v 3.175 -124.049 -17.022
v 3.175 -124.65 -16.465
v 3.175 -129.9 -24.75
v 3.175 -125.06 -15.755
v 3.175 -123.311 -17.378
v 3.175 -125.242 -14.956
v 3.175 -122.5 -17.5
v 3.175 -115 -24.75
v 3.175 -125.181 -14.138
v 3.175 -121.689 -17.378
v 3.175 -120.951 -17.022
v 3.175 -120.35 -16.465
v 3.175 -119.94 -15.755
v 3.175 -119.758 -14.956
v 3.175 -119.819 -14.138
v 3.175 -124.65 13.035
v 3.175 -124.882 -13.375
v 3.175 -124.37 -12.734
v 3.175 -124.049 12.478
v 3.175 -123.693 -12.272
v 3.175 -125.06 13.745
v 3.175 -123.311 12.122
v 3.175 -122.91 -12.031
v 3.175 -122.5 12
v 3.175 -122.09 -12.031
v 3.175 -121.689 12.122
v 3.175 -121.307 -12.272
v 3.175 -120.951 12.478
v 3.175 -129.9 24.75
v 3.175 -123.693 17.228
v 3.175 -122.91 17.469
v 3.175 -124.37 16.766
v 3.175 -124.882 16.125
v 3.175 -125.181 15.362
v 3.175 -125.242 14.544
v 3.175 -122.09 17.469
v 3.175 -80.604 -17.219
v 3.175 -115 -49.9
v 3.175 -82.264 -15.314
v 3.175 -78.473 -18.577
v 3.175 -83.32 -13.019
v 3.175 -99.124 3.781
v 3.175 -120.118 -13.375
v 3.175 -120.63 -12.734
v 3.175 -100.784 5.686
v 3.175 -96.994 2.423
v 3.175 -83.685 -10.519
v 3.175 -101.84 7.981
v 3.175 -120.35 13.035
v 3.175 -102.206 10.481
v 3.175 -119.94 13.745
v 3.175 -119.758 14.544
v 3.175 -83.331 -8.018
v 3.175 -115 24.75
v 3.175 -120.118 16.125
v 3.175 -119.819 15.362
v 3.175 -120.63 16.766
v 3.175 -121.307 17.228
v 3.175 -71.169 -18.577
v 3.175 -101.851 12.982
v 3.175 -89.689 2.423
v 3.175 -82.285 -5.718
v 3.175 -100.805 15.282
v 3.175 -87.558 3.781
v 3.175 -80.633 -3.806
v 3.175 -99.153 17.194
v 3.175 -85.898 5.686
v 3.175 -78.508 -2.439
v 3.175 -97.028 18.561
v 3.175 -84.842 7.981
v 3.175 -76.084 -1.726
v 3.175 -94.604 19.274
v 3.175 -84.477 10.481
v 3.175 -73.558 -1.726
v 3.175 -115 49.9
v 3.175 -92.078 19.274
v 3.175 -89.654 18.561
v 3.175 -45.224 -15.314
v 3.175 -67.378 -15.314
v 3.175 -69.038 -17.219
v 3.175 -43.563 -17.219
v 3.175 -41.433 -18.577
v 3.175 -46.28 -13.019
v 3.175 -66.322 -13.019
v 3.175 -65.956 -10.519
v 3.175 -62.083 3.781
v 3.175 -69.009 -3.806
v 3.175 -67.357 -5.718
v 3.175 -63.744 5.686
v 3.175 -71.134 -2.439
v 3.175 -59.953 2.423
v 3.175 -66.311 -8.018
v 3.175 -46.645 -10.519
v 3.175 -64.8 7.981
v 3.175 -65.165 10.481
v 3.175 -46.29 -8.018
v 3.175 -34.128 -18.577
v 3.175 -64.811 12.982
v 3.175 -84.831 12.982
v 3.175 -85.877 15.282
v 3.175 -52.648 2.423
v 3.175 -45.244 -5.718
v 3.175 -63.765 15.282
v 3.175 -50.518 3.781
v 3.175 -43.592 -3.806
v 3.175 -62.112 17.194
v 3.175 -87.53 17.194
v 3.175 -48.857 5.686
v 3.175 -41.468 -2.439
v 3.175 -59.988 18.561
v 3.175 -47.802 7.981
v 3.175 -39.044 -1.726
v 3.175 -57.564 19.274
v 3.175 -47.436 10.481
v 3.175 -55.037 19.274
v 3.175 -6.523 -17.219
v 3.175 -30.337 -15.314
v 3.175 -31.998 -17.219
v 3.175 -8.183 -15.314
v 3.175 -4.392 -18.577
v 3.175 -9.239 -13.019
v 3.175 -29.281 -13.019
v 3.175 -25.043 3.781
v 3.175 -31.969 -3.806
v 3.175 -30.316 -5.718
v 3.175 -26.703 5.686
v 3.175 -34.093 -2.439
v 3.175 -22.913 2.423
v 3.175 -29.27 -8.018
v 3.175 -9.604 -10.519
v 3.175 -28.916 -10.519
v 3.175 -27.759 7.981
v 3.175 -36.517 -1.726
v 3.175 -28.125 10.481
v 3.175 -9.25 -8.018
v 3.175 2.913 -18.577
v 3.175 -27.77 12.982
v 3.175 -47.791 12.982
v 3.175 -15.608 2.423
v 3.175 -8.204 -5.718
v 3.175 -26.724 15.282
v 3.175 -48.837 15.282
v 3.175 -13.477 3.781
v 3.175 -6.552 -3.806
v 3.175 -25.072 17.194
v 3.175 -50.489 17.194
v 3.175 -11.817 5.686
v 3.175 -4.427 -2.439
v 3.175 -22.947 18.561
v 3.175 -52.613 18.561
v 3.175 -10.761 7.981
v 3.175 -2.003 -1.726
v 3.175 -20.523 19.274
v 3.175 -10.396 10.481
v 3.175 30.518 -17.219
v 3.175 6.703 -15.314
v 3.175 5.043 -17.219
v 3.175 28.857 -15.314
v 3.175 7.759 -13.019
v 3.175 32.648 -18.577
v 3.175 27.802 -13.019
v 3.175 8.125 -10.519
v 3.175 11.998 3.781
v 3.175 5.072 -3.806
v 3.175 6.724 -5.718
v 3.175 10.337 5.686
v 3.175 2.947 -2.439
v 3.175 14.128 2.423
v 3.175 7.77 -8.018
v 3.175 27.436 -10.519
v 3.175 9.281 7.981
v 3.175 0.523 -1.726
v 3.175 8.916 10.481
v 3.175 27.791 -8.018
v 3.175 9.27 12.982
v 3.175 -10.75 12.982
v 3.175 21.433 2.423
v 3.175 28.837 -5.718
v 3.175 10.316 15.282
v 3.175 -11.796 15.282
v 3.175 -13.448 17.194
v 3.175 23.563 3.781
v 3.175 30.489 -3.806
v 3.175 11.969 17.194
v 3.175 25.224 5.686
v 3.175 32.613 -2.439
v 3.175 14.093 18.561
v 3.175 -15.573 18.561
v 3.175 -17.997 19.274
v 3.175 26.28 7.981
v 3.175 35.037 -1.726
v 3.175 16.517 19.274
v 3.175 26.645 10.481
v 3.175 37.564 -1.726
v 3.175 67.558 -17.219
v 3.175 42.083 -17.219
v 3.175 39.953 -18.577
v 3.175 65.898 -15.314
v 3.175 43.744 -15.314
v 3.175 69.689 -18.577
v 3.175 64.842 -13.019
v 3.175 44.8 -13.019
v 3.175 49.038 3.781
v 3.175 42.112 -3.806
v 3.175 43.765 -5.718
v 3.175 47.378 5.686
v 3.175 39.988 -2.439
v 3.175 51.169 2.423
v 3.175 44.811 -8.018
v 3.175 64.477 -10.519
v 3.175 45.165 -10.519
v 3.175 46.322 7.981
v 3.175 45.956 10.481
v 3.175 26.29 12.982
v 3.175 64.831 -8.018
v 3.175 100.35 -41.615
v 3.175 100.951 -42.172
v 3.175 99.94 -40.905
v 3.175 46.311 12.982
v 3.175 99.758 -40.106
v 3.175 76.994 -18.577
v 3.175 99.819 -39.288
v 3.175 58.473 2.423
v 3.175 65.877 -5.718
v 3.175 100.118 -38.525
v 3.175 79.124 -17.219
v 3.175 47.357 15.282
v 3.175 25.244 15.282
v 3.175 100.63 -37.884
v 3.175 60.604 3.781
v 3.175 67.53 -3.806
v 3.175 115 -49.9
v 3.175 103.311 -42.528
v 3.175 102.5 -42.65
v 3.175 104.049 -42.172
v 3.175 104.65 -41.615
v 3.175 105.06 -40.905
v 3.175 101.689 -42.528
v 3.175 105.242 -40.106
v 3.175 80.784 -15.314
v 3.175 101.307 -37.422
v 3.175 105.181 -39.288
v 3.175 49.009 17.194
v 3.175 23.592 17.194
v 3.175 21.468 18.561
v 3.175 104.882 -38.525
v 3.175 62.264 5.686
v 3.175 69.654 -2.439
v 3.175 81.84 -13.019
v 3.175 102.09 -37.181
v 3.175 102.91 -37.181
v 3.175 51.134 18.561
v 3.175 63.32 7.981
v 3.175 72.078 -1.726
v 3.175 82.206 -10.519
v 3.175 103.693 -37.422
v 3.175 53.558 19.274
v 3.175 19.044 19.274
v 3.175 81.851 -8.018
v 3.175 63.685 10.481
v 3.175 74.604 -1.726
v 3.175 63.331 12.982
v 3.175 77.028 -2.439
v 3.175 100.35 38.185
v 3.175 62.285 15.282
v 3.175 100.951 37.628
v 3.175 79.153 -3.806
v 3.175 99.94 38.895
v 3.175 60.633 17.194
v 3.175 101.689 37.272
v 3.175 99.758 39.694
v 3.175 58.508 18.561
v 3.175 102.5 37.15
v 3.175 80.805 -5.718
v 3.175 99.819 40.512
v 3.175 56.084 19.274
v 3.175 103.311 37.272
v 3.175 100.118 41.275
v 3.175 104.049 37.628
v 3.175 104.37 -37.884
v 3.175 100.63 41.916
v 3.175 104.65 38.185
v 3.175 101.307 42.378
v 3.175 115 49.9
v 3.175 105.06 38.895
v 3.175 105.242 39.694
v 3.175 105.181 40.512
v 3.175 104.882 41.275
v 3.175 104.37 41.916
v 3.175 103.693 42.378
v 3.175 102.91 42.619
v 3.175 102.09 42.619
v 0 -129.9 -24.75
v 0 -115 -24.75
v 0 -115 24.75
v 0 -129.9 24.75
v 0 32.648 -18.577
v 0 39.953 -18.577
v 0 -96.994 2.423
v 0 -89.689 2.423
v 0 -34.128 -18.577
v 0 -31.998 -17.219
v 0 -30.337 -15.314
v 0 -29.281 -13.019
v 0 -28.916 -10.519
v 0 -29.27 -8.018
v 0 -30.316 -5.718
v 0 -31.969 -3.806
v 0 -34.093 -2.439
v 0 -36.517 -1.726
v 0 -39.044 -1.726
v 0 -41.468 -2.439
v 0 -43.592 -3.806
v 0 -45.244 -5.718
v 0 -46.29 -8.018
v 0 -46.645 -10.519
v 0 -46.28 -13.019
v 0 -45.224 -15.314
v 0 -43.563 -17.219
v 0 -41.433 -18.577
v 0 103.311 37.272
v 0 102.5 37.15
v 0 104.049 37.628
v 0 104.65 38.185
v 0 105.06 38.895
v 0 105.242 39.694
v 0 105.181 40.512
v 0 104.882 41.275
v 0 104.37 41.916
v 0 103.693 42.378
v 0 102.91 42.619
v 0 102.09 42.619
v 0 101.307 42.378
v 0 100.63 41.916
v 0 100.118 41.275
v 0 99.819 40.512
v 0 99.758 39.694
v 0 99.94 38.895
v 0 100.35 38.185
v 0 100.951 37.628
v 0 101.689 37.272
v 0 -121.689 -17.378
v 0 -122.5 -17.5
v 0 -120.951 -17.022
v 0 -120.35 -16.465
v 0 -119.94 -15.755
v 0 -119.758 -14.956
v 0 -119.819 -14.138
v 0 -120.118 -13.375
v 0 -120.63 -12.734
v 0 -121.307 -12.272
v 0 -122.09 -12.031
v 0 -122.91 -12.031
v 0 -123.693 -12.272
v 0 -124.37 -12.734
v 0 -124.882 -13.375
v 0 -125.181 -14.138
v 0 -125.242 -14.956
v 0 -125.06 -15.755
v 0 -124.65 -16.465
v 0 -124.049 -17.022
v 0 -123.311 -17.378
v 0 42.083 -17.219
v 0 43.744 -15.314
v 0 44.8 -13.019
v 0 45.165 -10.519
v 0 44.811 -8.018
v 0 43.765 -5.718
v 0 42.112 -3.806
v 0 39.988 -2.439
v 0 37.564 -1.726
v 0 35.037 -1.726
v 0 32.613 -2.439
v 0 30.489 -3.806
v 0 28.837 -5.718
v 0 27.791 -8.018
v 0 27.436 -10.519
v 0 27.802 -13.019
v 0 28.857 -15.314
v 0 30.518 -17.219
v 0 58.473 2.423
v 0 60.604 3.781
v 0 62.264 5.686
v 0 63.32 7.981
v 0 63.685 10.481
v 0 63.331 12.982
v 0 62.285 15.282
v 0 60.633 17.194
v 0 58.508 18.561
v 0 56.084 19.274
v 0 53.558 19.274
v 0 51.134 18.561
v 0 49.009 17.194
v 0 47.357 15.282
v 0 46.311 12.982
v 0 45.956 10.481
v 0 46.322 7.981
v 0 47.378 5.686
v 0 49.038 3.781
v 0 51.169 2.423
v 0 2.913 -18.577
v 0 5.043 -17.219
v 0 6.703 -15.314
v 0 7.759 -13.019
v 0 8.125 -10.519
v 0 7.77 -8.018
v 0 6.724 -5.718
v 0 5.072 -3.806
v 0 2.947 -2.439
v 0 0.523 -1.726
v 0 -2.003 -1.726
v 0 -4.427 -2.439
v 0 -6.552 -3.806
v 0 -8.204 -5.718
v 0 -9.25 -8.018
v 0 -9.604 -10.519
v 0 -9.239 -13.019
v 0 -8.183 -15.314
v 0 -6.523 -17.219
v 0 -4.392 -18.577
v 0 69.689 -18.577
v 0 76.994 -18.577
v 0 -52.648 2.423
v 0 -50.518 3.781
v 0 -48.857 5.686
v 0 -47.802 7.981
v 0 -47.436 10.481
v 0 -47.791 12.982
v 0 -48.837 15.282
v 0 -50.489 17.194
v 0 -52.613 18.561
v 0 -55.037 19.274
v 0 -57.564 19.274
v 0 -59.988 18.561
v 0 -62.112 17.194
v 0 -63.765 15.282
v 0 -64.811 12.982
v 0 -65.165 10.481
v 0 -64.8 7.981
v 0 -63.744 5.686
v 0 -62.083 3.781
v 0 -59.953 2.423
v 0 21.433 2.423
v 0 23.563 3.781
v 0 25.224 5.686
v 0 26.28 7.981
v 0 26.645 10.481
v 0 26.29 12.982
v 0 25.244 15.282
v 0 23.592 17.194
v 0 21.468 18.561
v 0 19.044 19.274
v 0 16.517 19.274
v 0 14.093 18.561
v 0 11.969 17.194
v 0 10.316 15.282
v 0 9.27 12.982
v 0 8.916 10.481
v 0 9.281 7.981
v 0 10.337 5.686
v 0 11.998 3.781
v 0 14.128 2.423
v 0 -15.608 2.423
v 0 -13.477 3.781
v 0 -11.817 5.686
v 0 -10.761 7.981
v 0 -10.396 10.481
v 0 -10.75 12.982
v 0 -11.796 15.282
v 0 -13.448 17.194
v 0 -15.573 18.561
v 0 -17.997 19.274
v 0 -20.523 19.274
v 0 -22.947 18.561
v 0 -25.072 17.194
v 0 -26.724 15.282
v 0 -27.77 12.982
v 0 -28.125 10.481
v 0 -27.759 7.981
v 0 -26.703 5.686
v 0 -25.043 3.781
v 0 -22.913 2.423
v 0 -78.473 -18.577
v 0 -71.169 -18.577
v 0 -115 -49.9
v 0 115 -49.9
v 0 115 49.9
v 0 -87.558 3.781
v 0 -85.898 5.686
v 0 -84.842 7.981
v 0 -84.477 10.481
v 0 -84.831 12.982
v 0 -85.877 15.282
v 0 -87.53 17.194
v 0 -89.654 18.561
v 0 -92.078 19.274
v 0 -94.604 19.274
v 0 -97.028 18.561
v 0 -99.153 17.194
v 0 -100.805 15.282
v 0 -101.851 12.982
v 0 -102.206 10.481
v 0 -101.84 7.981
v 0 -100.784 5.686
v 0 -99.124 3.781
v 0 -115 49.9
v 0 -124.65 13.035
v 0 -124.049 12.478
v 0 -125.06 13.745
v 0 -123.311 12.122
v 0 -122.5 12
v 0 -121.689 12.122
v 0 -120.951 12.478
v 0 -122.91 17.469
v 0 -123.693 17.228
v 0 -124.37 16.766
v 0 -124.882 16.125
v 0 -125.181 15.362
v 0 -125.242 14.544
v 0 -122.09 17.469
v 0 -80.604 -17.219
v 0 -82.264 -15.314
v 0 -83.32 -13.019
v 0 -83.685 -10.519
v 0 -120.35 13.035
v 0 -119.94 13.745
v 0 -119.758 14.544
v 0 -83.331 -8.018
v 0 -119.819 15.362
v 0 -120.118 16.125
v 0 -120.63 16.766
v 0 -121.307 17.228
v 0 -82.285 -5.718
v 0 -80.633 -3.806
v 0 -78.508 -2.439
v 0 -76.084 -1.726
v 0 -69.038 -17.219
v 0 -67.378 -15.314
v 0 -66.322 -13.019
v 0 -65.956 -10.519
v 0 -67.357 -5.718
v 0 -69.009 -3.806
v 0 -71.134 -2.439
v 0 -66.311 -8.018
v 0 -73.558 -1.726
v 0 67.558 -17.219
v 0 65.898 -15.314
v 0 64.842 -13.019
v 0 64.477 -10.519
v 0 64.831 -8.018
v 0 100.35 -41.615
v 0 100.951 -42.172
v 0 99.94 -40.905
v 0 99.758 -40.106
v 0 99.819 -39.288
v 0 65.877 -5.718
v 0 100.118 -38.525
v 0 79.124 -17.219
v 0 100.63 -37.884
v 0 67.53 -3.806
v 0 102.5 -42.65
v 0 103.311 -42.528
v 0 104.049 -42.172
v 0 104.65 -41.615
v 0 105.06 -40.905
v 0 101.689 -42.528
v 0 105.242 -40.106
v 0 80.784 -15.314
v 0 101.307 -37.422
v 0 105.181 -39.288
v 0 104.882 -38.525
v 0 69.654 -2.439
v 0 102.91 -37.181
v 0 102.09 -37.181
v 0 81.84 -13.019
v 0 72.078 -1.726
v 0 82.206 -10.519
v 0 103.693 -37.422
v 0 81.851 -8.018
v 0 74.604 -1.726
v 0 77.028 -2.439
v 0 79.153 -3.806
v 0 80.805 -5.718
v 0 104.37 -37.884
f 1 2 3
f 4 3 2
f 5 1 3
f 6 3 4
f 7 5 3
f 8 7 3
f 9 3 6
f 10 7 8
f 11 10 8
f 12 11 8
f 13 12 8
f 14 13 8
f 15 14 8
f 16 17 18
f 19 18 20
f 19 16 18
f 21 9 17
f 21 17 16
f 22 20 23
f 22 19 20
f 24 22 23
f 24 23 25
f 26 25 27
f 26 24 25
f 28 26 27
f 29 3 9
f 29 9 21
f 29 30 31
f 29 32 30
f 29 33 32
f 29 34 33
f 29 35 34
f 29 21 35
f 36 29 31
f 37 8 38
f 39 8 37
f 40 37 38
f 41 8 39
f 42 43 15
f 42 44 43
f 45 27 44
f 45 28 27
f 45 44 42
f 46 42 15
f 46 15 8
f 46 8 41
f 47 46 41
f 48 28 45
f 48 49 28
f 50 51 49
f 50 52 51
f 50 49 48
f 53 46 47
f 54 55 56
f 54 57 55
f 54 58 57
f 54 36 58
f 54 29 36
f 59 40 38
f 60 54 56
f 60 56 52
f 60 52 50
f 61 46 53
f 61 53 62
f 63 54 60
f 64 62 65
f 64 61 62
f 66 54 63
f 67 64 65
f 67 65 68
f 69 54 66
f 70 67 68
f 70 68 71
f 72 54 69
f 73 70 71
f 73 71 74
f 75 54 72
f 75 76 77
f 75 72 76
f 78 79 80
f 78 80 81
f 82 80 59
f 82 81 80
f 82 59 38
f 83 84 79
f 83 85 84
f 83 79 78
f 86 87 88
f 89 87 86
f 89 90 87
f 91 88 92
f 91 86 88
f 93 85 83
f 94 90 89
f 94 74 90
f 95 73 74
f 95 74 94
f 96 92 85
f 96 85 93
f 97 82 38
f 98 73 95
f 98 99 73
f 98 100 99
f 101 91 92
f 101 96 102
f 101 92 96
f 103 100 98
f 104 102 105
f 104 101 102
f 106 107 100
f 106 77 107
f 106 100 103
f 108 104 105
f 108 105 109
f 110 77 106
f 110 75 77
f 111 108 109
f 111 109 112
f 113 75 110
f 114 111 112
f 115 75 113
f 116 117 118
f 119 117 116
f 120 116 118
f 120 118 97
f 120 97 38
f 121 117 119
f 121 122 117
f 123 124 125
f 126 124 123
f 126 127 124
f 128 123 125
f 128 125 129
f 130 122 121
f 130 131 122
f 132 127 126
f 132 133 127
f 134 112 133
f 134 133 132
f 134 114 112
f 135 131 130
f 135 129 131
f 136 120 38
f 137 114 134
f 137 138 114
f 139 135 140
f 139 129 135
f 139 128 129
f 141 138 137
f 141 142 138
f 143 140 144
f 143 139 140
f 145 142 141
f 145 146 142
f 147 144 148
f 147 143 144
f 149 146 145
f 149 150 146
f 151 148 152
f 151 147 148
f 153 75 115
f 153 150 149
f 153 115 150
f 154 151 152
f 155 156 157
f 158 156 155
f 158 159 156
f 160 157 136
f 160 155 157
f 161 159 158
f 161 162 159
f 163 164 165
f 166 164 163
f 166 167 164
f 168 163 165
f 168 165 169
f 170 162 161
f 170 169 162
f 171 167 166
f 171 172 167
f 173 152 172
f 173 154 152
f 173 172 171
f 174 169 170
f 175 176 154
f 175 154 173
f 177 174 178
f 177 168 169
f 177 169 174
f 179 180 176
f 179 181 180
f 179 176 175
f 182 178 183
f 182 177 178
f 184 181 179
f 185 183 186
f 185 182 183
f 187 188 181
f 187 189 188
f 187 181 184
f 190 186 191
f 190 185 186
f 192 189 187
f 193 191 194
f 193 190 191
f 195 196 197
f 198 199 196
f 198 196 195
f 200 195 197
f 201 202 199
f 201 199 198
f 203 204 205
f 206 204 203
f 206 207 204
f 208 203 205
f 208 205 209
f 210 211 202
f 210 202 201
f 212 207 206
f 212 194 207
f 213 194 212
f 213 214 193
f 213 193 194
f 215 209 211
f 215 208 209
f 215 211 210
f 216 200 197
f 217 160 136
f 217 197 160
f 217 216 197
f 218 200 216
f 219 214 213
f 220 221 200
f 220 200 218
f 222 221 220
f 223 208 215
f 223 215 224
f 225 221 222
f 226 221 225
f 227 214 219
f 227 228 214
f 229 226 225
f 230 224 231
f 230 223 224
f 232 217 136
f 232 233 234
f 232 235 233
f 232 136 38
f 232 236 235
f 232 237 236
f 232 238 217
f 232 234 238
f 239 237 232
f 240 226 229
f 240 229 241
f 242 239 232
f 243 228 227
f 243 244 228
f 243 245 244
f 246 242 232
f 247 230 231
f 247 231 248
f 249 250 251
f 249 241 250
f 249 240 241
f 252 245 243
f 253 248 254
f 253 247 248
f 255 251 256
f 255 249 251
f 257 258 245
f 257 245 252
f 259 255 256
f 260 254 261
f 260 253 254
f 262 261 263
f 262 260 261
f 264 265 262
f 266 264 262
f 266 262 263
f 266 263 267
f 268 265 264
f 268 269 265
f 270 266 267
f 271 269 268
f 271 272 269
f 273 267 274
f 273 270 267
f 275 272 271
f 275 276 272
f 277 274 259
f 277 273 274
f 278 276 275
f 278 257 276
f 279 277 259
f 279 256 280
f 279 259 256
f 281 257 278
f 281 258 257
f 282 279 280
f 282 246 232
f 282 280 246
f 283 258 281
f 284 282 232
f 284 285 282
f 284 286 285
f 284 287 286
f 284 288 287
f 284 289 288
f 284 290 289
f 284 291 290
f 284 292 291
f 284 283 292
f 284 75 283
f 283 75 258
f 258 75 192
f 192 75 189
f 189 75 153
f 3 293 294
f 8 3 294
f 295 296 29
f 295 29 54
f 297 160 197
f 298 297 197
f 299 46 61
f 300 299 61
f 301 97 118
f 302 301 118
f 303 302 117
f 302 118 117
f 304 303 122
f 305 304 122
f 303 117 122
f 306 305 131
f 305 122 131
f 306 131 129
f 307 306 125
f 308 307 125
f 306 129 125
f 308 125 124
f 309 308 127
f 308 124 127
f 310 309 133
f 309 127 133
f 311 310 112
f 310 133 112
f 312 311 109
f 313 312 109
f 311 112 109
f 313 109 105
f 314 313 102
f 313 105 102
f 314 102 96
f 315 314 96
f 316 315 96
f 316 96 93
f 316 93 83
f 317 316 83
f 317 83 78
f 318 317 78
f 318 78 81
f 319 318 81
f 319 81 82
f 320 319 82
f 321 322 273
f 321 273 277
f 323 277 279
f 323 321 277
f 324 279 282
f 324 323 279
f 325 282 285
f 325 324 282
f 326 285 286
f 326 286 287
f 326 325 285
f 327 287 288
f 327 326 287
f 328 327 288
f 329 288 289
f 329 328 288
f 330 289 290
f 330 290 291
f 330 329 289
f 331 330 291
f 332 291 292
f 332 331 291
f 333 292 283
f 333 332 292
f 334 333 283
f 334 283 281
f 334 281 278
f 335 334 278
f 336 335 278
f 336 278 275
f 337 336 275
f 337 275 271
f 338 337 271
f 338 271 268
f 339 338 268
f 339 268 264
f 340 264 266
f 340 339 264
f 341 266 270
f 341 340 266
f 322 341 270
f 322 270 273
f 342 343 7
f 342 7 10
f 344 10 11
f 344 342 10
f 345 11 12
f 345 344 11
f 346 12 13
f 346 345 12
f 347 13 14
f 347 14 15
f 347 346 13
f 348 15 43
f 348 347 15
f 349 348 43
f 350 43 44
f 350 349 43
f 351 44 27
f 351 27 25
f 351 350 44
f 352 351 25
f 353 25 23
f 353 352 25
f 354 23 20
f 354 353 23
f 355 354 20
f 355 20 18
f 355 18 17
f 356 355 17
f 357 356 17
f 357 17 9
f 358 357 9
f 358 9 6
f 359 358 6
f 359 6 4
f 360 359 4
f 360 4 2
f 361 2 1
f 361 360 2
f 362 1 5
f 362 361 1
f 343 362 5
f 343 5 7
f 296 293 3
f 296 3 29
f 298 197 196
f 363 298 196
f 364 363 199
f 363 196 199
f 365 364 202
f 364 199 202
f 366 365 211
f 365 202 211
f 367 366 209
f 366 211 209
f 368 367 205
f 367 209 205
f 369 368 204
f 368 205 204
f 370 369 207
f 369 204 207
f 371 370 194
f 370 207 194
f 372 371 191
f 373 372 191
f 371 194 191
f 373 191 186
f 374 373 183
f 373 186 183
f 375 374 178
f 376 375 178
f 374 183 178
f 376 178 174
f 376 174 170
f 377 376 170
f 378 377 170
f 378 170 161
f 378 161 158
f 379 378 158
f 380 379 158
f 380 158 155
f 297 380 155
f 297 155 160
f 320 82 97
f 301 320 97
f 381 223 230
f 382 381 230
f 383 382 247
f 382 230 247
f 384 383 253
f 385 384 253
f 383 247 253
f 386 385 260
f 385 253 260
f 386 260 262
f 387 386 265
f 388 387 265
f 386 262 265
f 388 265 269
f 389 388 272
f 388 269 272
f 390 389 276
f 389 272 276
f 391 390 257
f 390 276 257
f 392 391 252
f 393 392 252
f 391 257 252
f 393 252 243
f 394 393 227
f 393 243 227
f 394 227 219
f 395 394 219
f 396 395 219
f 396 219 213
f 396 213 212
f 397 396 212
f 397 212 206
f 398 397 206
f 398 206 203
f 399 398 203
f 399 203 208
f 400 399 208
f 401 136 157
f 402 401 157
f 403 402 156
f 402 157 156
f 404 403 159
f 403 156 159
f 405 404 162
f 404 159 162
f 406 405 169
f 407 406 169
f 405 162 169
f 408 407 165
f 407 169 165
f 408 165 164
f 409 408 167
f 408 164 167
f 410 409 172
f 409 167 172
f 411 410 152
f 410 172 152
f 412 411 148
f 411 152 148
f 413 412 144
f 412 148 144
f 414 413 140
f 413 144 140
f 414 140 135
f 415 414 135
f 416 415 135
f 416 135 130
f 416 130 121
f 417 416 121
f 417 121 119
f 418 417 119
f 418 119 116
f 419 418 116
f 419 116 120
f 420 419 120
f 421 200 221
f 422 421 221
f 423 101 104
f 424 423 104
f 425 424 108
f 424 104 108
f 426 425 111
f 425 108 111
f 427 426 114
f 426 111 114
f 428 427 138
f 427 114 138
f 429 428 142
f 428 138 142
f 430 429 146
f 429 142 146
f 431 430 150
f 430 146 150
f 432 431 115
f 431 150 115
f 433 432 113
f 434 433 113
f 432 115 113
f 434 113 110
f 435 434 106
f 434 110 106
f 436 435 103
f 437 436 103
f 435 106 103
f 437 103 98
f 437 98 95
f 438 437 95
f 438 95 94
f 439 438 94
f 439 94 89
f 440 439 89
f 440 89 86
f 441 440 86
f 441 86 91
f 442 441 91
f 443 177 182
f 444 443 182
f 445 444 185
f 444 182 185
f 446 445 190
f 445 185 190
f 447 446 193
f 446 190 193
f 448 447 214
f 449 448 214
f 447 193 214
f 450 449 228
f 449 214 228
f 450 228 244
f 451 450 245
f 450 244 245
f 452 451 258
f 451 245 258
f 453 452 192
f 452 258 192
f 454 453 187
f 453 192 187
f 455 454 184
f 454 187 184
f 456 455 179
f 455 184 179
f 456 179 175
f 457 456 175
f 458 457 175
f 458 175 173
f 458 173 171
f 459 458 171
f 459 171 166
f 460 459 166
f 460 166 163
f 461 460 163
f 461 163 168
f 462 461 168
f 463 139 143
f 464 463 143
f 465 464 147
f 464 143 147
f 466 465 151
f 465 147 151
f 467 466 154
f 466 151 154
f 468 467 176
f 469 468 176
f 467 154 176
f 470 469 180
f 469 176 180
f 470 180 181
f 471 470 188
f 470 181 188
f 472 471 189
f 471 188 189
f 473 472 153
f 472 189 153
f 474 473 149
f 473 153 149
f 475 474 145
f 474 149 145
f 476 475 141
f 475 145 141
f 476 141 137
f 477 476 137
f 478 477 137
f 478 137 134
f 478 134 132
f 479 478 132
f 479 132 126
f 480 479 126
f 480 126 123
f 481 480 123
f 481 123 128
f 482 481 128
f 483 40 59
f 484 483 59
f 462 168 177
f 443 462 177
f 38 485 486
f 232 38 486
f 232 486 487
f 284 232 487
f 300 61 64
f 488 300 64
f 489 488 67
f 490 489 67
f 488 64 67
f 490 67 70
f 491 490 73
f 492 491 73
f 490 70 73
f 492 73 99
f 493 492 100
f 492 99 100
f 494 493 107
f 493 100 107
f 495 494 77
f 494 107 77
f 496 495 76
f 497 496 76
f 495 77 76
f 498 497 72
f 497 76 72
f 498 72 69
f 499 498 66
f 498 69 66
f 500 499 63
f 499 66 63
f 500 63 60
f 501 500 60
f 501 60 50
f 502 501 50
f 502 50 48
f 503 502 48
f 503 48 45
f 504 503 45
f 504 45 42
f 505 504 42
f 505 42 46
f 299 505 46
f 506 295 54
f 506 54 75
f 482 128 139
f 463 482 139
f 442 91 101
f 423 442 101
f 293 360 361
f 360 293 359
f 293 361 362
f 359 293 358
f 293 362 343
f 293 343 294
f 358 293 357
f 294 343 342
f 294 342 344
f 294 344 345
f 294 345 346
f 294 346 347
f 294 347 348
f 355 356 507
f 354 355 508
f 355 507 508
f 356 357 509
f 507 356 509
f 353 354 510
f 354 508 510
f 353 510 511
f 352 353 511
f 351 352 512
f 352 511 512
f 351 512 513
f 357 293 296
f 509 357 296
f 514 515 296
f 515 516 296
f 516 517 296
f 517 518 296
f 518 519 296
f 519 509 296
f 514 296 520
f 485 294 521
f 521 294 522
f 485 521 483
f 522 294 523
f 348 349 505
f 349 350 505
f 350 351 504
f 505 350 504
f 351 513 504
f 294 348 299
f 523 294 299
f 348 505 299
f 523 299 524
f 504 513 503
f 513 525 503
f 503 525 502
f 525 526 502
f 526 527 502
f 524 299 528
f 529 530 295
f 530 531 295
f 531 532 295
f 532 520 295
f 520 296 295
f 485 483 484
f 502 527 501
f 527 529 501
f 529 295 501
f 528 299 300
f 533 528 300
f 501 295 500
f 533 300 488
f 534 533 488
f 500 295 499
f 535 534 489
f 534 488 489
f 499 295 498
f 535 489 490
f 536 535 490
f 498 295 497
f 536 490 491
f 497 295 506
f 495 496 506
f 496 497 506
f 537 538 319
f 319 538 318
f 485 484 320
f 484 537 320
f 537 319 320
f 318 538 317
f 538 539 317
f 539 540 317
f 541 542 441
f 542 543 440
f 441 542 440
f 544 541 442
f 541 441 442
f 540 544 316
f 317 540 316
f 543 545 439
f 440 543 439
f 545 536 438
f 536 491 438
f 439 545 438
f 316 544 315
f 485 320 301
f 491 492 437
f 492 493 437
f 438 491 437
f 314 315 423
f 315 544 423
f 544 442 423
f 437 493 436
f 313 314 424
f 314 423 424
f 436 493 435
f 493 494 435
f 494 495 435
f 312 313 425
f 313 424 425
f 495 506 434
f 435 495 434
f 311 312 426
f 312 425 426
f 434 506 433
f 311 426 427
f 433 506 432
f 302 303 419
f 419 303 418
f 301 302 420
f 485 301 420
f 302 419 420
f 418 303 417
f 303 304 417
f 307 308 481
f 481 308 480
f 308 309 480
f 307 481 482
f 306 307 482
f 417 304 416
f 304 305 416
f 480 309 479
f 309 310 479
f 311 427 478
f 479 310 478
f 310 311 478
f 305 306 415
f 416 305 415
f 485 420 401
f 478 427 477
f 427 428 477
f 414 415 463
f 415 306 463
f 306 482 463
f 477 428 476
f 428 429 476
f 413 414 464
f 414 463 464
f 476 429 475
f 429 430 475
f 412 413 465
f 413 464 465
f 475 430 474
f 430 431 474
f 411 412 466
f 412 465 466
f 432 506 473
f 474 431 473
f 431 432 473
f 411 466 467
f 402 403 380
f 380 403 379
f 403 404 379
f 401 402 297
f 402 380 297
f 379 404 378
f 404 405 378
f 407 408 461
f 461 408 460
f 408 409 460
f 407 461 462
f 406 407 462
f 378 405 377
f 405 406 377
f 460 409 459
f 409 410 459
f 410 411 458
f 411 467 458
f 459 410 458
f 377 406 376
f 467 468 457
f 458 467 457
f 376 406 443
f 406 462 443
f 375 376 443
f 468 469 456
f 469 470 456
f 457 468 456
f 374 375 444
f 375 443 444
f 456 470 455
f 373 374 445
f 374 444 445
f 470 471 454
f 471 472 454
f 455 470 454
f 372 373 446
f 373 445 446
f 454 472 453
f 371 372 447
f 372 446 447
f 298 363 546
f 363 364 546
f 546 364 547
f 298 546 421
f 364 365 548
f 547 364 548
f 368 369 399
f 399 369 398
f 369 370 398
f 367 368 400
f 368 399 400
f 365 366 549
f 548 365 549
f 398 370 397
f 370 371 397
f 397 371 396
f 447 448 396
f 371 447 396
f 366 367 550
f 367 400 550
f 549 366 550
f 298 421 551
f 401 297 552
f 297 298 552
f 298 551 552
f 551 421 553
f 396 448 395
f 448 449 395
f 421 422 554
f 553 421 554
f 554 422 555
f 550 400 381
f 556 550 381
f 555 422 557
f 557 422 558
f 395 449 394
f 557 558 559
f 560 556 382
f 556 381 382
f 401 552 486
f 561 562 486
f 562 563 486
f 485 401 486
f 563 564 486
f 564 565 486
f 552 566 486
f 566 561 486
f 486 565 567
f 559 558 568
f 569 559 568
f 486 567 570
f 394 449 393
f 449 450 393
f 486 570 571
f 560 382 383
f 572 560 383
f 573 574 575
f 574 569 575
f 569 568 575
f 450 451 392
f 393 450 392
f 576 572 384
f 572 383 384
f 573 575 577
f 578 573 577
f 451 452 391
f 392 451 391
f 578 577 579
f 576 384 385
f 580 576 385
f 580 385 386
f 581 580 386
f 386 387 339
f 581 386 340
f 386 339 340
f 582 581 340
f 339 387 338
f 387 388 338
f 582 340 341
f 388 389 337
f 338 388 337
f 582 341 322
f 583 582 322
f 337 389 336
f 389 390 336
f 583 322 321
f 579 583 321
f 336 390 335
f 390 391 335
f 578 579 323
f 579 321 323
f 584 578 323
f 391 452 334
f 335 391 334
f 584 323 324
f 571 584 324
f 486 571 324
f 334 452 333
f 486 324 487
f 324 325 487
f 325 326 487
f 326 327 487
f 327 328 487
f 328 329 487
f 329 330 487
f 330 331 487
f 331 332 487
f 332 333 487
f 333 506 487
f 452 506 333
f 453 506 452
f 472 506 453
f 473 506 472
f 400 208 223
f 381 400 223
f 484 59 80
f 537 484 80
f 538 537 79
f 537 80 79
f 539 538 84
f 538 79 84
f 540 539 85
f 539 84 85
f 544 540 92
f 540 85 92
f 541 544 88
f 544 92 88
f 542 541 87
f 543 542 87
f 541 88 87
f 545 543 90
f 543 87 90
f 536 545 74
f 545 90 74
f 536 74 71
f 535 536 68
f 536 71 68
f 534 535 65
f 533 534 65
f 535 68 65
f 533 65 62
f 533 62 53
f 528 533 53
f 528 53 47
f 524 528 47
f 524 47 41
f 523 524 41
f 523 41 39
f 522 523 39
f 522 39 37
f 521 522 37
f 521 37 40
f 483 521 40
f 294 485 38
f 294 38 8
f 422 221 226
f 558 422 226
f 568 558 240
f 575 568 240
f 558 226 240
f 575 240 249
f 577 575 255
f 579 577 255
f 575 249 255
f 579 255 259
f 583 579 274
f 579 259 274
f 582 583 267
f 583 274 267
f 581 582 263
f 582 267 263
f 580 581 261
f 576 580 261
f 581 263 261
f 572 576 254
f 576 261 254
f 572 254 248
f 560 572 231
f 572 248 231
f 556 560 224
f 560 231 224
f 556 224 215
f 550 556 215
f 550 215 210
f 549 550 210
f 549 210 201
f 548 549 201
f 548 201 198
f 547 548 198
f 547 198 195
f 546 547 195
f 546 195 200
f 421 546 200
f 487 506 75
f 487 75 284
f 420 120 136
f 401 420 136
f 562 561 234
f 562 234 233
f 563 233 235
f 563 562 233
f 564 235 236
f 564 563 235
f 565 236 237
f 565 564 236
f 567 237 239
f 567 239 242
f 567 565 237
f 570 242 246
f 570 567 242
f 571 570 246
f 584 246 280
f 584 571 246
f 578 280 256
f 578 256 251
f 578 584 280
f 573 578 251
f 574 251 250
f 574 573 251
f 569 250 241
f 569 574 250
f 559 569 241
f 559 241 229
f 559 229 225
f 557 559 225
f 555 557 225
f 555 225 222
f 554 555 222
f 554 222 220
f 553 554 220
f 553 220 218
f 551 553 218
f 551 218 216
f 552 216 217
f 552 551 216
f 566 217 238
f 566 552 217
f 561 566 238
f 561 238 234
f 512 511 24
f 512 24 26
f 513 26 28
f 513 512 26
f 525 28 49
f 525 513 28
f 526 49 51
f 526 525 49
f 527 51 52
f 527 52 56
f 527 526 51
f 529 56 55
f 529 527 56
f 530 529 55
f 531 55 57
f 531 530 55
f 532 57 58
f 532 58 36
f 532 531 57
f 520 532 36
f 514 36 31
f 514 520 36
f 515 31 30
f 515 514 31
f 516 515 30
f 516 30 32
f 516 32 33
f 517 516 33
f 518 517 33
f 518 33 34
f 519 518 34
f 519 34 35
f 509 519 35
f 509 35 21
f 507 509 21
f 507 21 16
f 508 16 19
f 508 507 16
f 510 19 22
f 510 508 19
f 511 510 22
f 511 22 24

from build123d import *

# Parameters (mm, degrees)
SKETCH1_W           = 14.9
SKETCH1_H           = 49.5
SKETCH1_R           = 2.75
SKETCH1_W_2         = 230
SKETCH1_H_2         = 99.8
BOSS_EXTRUDE1_DEPTH = 3.175
CUT_EXTRUDE1_DEPTH  = 140.190878383


with BuildPart() as part:
    # Sketch1 → Boss-Extrude1 (new body)
    # profile 1 of 2: a face of its own
    with BuildSketch(Plane.YZ):
        with Locations((-122.45, 0)):
            Rectangle(SKETCH1_W, SKETCH1_H)
        with Locations(Location((-122.5, -14.75, 0), (0, 0, 270))):
            Circle(SKETCH1_R, mode=Mode.SUBTRACT)
        with Locations(Location((-122.5, 14.75, 0), (0, 0, 270))):
            Circle(SKETCH1_R, mode=Mode.SUBTRACT)
    # profile 2 of 2: a face of its own
    with BuildSketch(Plane.YZ):
        Rectangle(SKETCH1_W_2, SKETCH1_H_2)
        with Locations(Location((102.5, -39.9, 0), (0, 0, 270))):
            Circle(SKETCH1_R, mode=Mode.SUBTRACT)
        with Locations(Location((102.5, 39.9, 0), (0, 0, 270))):
            Circle(SKETCH1_R, mode=Mode.SUBTRACT)
    extrude(amount=BOSS_EXTRUDE1_DEPTH)

    # Sketch2 → Cut-Extrude1 (cut, through all)
    with BuildSketch(Plane.YZ.offset(3.175)):
        with BuildLine():
            Line((51.1685143, 2.4228), (58.473299942, 2.4228))
            ThreePointArc((58.473299942, 2.4228), (54.820907121, 19.3646), (51.1685143, 2.4228))
        make_face()
        with BuildLine():
            Line((69.688773477, -18.5772), (76.99355912, -18.5772))
            ThreePointArc((76.99355912, -18.5772), (73.341166299, -1.6354), (69.688773477, -18.5772))
        make_face()
        with BuildLine():
            Line((14.127995945, 2.4228), (21.432781587, 2.4228))
            ThreePointArc((21.432781587, 2.4228), (17.780388766, 19.3646), (14.127995945, 2.4228))
        make_face()
        with BuildLine():
            Line((32.648255122, -18.5772), (39.953040765, -18.5772))
            ThreePointArc((39.953040765, -18.5772), (36.300647944, -1.6354), (32.648255122, -18.5772))
        make_face()
        with BuildLine():
            Line((-22.91252241, 2.4228), (-15.607736768, 2.4228))
            ThreePointArc((-15.607736768, 2.4228), (-19.260129589, 19.3646), (-22.91252241, 2.4228))
        make_face()
        with BuildLine():
            Line((-4.392263232, -18.5772), (2.91252241, -18.5772))
            ThreePointArc((2.91252241, -18.5772), (-0.739870411, -1.6354), (-4.392263232, -18.5772))
        make_face()
        with BuildLine():
            Line((-59.953040765, 2.4228), (-52.648255122, 2.4228))
            ThreePointArc((-52.648255122, 2.4228), (-56.300647944, 19.3646), (-59.953040765, 2.4228))
        make_face()
        with BuildLine():
            Line((-41.432781587, -18.5772), (-34.127995945, -18.5772))
            ThreePointArc((-34.127995945, -18.5772), (-37.780388766, -1.6354), (-41.432781587, -18.5772))
        make_face()
        with BuildLine():
            Line((-96.99355912, 2.4228), (-89.688773477, 2.4228))
            ThreePointArc((-89.688773477, 2.4228), (-93.341166299, 19.3646), (-96.99355912, 2.4228))
        make_face()
        with BuildLine():
            Line((-78.473299942, -18.5772), (-71.1685143, -18.5772))
            ThreePointArc((-71.1685143, -18.5772), (-74.820907121, -1.6354), (-78.473299942, -18.5772))
        make_face()
    extrude(amount=-CUT_EXTRUDE1_DEPTH, mode=Mode.SUBTRACT)


solid = part.part
